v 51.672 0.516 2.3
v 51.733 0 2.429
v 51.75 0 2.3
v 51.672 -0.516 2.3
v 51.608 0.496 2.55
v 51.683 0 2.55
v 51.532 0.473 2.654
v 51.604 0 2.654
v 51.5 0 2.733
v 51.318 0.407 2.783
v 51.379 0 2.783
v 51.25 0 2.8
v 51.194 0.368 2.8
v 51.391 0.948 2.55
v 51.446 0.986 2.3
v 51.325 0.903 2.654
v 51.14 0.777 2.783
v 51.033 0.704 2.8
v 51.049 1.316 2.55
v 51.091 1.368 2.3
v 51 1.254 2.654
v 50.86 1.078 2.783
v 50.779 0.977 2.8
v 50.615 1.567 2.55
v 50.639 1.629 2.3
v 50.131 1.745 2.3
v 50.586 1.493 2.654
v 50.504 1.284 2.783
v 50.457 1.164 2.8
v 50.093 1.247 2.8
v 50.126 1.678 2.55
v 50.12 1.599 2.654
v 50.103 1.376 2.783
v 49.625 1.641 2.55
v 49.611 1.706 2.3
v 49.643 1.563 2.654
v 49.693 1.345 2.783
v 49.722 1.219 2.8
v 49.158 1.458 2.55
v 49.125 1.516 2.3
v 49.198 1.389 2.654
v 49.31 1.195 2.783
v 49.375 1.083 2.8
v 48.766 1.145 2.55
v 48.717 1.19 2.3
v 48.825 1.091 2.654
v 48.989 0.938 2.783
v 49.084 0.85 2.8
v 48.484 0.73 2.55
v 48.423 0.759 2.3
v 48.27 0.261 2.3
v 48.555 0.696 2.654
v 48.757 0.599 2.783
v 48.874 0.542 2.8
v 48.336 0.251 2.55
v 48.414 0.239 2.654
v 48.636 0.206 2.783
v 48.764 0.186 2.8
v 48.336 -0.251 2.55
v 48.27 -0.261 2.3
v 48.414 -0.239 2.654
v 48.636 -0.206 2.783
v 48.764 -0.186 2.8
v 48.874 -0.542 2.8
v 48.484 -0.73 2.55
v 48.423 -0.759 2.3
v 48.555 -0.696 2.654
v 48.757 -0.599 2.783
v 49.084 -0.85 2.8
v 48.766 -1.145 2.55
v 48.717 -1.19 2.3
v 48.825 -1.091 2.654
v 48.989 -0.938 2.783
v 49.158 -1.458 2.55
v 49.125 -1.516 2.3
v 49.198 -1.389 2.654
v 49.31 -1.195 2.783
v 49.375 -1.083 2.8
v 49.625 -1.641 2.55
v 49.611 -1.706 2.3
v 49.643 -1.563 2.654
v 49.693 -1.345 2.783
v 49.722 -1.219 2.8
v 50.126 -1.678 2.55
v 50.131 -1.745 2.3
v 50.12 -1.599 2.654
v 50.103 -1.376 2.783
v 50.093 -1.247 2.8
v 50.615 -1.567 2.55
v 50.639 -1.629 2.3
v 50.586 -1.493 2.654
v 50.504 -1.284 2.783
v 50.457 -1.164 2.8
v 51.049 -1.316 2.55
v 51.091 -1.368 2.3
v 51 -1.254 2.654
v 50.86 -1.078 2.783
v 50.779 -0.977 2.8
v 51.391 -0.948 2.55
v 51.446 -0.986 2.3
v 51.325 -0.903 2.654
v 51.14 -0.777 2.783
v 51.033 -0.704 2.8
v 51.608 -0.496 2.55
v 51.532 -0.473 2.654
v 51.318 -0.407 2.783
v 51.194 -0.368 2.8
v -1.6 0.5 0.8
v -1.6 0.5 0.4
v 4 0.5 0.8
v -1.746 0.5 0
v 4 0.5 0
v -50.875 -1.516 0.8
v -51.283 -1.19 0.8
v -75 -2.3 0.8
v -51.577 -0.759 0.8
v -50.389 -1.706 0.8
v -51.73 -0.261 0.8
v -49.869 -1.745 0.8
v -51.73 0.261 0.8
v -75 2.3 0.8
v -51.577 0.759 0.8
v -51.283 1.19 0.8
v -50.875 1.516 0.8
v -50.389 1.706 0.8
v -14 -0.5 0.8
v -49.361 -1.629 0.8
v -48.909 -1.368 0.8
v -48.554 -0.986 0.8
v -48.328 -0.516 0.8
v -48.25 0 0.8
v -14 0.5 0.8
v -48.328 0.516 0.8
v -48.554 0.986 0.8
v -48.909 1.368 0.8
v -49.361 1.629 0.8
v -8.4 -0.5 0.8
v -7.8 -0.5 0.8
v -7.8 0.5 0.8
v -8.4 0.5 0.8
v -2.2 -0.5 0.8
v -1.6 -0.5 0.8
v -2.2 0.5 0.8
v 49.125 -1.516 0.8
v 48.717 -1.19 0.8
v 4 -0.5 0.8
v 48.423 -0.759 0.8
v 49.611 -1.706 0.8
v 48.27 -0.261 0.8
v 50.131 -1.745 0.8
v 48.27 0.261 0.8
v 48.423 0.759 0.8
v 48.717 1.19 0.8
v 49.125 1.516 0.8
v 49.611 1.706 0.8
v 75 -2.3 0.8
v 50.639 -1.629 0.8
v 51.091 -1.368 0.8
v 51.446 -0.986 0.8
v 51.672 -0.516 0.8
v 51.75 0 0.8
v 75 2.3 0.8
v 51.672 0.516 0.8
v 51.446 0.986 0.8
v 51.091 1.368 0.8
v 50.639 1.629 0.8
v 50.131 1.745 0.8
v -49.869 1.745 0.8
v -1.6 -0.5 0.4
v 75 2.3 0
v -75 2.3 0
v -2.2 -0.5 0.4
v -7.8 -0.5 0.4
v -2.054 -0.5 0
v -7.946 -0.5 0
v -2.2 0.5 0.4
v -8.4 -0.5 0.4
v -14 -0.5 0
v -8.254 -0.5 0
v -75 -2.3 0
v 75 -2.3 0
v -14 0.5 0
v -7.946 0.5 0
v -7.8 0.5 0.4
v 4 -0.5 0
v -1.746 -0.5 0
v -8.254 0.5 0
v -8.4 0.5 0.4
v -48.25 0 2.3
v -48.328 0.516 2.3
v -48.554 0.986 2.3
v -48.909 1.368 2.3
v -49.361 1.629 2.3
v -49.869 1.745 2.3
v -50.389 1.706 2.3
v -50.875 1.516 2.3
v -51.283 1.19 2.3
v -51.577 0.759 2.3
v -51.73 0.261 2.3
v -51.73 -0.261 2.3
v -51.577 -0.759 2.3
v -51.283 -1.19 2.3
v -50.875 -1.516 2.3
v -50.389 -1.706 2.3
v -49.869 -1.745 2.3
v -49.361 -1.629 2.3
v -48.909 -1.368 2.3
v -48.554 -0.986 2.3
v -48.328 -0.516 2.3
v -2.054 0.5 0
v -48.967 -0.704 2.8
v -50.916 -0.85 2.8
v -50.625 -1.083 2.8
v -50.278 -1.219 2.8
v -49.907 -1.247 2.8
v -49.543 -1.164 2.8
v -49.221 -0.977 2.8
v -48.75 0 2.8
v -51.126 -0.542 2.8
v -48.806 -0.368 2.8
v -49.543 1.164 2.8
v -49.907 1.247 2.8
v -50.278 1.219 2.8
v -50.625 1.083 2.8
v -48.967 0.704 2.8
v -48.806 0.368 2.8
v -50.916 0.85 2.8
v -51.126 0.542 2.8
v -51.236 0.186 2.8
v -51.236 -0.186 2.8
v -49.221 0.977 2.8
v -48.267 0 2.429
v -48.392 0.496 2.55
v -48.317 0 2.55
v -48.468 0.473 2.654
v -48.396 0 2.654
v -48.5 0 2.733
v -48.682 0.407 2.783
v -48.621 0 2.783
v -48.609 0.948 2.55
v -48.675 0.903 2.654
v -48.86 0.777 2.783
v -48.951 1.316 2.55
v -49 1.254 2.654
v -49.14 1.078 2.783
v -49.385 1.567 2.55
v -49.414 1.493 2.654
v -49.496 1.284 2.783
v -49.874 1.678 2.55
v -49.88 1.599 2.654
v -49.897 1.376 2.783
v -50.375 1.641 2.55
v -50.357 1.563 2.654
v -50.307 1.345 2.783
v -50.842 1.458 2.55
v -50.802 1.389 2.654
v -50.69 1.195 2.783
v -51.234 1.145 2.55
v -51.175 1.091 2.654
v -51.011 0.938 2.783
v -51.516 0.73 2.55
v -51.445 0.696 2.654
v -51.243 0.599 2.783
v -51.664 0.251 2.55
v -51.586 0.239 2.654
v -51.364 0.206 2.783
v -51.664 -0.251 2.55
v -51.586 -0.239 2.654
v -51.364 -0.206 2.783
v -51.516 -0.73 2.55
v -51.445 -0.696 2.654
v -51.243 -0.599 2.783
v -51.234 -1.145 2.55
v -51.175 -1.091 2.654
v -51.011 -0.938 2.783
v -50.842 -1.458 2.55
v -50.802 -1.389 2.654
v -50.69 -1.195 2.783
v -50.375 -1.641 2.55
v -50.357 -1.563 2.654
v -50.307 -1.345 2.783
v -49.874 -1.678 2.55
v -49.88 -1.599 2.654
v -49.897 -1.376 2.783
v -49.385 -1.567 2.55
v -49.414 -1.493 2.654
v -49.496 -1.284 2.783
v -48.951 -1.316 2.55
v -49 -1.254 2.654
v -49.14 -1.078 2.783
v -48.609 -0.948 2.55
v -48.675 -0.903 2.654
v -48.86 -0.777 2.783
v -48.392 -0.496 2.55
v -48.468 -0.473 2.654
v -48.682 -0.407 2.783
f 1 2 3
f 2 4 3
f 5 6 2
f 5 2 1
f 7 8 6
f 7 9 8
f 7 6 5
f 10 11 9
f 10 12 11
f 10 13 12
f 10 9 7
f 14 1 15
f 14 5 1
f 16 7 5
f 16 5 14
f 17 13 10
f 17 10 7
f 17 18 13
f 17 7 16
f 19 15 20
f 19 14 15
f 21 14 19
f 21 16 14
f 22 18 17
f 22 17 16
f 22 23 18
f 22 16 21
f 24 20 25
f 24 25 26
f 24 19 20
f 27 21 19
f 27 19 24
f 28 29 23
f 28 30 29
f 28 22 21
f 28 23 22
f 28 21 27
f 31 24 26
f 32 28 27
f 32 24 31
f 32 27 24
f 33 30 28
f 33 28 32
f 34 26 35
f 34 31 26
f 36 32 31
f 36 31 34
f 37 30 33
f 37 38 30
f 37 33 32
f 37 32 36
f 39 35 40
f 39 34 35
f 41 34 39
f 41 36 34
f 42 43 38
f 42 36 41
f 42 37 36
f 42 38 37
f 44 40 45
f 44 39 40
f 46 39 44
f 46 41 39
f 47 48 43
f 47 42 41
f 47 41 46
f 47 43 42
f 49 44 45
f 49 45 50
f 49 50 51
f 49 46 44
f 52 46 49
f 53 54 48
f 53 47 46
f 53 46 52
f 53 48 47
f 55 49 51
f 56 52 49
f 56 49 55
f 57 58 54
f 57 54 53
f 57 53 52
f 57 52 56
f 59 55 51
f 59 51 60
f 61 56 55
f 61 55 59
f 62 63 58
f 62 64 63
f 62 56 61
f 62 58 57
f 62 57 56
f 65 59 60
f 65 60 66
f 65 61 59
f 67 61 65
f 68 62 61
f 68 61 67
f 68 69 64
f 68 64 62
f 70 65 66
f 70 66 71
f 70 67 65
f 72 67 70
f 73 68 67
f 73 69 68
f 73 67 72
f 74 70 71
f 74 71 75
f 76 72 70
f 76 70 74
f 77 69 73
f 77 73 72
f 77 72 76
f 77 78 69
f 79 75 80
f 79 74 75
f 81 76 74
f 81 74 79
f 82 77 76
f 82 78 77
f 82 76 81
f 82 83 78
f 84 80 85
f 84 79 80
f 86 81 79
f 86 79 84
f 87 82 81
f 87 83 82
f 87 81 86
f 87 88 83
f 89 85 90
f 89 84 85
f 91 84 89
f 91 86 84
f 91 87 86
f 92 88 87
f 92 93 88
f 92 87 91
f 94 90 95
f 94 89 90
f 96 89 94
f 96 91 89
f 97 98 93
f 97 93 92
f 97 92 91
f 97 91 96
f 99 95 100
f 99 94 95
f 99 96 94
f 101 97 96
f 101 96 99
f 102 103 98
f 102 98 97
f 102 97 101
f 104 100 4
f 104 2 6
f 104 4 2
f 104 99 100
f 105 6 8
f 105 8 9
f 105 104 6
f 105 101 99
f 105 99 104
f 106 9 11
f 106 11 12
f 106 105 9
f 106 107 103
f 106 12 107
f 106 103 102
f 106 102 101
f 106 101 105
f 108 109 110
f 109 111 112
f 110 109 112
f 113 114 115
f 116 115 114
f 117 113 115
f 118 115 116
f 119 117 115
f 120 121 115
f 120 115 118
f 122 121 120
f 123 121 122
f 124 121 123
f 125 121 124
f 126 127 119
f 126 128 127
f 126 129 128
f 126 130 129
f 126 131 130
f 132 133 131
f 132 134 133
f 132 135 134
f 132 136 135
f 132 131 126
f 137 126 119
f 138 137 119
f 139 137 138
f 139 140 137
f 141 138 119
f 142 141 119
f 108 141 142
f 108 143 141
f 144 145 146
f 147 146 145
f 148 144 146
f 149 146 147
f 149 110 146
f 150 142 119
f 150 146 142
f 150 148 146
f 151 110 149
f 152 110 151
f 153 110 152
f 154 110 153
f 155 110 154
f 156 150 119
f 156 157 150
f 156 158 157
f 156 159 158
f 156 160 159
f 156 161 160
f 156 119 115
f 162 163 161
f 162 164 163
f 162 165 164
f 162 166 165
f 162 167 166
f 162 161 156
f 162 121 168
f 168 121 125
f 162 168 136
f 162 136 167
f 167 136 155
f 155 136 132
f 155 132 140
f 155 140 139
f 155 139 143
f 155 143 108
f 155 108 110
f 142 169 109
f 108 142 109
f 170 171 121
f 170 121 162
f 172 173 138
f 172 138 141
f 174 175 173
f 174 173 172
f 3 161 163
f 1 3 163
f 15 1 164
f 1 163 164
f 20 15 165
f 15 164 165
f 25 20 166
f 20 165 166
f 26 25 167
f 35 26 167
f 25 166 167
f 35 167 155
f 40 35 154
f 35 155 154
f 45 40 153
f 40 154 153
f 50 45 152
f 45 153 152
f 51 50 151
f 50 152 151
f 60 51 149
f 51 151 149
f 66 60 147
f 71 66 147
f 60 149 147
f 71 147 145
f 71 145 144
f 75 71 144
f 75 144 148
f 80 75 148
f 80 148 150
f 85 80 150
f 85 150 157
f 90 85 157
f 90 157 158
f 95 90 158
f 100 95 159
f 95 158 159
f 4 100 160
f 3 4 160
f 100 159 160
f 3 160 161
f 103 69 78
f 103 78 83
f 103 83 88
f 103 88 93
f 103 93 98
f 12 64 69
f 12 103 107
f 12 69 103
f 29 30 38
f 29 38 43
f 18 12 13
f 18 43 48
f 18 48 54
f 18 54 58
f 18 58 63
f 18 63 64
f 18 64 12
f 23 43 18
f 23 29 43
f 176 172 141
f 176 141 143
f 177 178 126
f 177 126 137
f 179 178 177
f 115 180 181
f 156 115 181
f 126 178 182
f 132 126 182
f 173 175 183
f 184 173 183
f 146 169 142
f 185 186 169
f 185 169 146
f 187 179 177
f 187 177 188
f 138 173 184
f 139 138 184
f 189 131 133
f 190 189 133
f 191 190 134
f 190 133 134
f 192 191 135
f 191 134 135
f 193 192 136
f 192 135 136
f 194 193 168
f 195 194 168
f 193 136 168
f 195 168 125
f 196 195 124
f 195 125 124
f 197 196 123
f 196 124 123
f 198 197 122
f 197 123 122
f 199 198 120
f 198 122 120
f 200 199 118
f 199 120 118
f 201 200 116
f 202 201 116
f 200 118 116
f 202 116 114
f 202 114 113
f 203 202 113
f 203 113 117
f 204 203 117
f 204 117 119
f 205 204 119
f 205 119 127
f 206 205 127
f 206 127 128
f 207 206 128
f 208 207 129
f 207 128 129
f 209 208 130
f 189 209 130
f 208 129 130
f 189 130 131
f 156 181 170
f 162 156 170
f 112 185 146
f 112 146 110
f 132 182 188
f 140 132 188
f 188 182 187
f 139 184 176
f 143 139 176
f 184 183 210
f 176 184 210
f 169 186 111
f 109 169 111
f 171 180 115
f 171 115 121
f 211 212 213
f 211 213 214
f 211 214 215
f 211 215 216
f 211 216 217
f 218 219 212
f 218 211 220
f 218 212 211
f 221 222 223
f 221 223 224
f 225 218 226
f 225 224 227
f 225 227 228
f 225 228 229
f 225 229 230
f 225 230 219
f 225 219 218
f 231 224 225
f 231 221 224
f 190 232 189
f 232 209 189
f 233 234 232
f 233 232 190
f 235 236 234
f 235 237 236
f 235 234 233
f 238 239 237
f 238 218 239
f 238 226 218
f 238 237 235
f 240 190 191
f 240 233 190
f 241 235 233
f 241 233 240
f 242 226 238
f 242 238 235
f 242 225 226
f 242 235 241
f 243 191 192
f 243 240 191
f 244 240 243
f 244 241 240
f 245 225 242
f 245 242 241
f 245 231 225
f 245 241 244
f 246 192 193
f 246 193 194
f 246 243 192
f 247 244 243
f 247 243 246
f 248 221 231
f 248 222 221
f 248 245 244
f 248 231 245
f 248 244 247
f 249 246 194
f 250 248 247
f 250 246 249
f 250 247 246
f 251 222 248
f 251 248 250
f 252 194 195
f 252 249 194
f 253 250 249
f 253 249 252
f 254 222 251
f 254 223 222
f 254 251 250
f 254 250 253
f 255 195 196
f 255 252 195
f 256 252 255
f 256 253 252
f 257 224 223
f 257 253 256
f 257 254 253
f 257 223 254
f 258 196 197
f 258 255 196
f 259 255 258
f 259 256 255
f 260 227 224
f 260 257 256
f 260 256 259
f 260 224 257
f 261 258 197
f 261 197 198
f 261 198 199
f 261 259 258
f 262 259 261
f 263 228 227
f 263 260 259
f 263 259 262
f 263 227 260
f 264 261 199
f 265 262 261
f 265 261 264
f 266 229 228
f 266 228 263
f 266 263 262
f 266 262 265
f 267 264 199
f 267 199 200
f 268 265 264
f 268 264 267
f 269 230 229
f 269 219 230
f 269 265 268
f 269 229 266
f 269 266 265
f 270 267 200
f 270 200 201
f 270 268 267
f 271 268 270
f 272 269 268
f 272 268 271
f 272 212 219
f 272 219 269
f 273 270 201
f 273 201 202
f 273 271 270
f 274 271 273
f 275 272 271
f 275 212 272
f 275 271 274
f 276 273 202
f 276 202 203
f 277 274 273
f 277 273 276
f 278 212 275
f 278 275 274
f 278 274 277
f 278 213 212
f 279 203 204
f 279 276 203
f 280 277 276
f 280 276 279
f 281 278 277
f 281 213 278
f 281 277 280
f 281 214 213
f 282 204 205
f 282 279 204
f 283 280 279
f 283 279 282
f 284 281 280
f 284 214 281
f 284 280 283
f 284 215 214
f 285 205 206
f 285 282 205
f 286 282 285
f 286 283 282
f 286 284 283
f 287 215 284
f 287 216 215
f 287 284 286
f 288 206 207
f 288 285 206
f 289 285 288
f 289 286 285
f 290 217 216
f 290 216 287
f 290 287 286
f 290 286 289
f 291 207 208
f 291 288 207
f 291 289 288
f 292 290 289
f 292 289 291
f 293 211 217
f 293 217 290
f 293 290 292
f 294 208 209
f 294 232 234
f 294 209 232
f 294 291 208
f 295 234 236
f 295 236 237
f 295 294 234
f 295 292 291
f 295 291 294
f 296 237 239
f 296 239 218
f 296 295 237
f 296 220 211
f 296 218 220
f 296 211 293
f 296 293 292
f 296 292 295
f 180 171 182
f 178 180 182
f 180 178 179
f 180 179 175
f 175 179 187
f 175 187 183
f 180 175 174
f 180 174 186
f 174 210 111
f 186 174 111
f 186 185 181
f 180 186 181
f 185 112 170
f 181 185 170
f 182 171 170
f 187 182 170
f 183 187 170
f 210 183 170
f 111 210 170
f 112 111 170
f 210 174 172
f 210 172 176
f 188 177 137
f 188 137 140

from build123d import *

# Parameters (mm, degrees)
SKICA2_W                = 150
SKICA2_H                = 4.6
SKICA2_W_2              = 18
SKICA2_H_2              = 1
P_IDAT_VYSUNUT_M2_DEPTH = 0.8
SKICA3_R                = 1.75
P_IDAT_VYSUNUT_M3_DEPTH = 2
ZAOBLIT1_R              = 0.5
SKICA4_W                = 0.6
SKICA4_H                = 1
P_IDAT_VYSUNUT_M4_DEPTH = 0.8
ZKOSEN_1_SIZE           = 0.4
ZKOSEN_1_SIZE2          = 0.145588094
ZKOSEN_1_PART_2_SIZE    = 0.4
ZKOSEN_1_PART_2_SIZE2   = 0.145588094
ZKOSEN_1_PART_3_SIZE    = 0.4
ZKOSEN_1_PART_3_SIZE2   = 0.145588094
ZKOSEN_1_PART_4_SIZE    = 0.4
ZKOSEN_1_PART_4_SIZE2   = 0.145588094


with BuildPart() as part:
    # Skica2 → Přidat vysunutím2 (new body)
    with BuildSketch(Plane.XY):
        Rectangle(SKICA2_W, SKICA2_H)
        with Locations((-5, 0)):
            Rectangle(SKICA2_W_2, SKICA2_H_2, mode=Mode.SUBTRACT)
    extrude(amount=P_IDAT_VYSUNUT_M2_DEPTH)

    # Skica3 → Přidat vysunutím3 (add)
    with BuildSketch(Plane.XY.offset(0.8)):
        with Locations((-50, 0)):
            Circle(SKICA3_R)
        with Locations((50, 0)):
            Circle(SKICA3_R)
    extrude(amount=P_IDAT_VYSUNUT_M3_DEPTH)

    # Zaoblit1
    zaoblit1_edges = [part.edges().sort_by_distance(p)[0] for p in [
        (-51.75, 0, 2.8),
        (48.25, 0, 2.8),
    ]]
    fillet(zaoblit1_edges, radius=ZAOBLIT1_R)

    # Skica4 → Přidat vysunutím4 (add)
    with BuildSketch(Plane(origin=(0, 0, 0), x_dir=(-1, 0, 0), z_dir=(0, 0, -1))):
        with Locations((1.9, 0)):
            Rectangle(SKICA4_W, SKICA4_H)
        with Locations((8.1, 0)):
            Rectangle(SKICA4_W, SKICA4_H)
    extrude(amount=-P_IDAT_VYSUNUT_M4_DEPTH)

    # Zkosení1
    zkosen_1_edges = [part.edges().sort_by_distance(p)[0] for p in [
        (-1.6, 0, 0),
    ]]
    zkosen_1_side = [part.faces().sort_by_distance(p)[0] for p in [
        (-1.6, 0, 0.4),
    ]]
    chamfer(zkosen_1_edges, length=ZKOSEN_1_SIZE, length2=ZKOSEN_1_SIZE2, reference=zkosen_1_side[0])

    # Zkosení1 part 2
    zkosen_1_part_2_edges = [part.edges().sort_by_distance(p)[0] for p in [
        (-2.2, 0, 0),
    ]]
    zkosen_1_part_2_side = [part.faces().sort_by_distance(p)[0] for p in [
        (-2.2, 0, 0.4),
    ]]
    chamfer(zkosen_1_part_2_edges, length=ZKOSEN_1_PART_2_SIZE, length2=ZKOSEN_1_PART_2_SIZE2, reference=zkosen_1_part_2_side[0])

    # Zkosení1 part 3
    zkosen_1_part_3_edges = [part.edges().sort_by_distance(p)[0] for p in [
        (-8.4, 0, 0),
    ]]
    zkosen_1_part_3_side = [part.faces().sort_by_distance(p)[0] for p in [
        (-8.4, 0, 0.4),
    ]]
    chamfer(zkosen_1_part_3_edges, length=ZKOSEN_1_PART_3_SIZE, length2=ZKOSEN_1_PART_3_SIZE2, reference=zkosen_1_part_3_side[0])

    # Zkosení1 part 4
    zkosen_1_part_4_edges = [part.edges().sort_by_distance(p)[0] for p in [
        (-7.8, 0, 0),
    ]]
    zkosen_1_part_4_side = [part.faces().sort_by_distance(p)[0] for p in [
        (-7.8, 0, 0.4),
    ]]
    chamfer(zkosen_1_part_4_edges, length=ZKOSEN_1_PART_4_SIZE, length2=ZKOSEN_1_PART_4_SIZE2, reference=zkosen_1_part_4_side[0])


solid = part.part
